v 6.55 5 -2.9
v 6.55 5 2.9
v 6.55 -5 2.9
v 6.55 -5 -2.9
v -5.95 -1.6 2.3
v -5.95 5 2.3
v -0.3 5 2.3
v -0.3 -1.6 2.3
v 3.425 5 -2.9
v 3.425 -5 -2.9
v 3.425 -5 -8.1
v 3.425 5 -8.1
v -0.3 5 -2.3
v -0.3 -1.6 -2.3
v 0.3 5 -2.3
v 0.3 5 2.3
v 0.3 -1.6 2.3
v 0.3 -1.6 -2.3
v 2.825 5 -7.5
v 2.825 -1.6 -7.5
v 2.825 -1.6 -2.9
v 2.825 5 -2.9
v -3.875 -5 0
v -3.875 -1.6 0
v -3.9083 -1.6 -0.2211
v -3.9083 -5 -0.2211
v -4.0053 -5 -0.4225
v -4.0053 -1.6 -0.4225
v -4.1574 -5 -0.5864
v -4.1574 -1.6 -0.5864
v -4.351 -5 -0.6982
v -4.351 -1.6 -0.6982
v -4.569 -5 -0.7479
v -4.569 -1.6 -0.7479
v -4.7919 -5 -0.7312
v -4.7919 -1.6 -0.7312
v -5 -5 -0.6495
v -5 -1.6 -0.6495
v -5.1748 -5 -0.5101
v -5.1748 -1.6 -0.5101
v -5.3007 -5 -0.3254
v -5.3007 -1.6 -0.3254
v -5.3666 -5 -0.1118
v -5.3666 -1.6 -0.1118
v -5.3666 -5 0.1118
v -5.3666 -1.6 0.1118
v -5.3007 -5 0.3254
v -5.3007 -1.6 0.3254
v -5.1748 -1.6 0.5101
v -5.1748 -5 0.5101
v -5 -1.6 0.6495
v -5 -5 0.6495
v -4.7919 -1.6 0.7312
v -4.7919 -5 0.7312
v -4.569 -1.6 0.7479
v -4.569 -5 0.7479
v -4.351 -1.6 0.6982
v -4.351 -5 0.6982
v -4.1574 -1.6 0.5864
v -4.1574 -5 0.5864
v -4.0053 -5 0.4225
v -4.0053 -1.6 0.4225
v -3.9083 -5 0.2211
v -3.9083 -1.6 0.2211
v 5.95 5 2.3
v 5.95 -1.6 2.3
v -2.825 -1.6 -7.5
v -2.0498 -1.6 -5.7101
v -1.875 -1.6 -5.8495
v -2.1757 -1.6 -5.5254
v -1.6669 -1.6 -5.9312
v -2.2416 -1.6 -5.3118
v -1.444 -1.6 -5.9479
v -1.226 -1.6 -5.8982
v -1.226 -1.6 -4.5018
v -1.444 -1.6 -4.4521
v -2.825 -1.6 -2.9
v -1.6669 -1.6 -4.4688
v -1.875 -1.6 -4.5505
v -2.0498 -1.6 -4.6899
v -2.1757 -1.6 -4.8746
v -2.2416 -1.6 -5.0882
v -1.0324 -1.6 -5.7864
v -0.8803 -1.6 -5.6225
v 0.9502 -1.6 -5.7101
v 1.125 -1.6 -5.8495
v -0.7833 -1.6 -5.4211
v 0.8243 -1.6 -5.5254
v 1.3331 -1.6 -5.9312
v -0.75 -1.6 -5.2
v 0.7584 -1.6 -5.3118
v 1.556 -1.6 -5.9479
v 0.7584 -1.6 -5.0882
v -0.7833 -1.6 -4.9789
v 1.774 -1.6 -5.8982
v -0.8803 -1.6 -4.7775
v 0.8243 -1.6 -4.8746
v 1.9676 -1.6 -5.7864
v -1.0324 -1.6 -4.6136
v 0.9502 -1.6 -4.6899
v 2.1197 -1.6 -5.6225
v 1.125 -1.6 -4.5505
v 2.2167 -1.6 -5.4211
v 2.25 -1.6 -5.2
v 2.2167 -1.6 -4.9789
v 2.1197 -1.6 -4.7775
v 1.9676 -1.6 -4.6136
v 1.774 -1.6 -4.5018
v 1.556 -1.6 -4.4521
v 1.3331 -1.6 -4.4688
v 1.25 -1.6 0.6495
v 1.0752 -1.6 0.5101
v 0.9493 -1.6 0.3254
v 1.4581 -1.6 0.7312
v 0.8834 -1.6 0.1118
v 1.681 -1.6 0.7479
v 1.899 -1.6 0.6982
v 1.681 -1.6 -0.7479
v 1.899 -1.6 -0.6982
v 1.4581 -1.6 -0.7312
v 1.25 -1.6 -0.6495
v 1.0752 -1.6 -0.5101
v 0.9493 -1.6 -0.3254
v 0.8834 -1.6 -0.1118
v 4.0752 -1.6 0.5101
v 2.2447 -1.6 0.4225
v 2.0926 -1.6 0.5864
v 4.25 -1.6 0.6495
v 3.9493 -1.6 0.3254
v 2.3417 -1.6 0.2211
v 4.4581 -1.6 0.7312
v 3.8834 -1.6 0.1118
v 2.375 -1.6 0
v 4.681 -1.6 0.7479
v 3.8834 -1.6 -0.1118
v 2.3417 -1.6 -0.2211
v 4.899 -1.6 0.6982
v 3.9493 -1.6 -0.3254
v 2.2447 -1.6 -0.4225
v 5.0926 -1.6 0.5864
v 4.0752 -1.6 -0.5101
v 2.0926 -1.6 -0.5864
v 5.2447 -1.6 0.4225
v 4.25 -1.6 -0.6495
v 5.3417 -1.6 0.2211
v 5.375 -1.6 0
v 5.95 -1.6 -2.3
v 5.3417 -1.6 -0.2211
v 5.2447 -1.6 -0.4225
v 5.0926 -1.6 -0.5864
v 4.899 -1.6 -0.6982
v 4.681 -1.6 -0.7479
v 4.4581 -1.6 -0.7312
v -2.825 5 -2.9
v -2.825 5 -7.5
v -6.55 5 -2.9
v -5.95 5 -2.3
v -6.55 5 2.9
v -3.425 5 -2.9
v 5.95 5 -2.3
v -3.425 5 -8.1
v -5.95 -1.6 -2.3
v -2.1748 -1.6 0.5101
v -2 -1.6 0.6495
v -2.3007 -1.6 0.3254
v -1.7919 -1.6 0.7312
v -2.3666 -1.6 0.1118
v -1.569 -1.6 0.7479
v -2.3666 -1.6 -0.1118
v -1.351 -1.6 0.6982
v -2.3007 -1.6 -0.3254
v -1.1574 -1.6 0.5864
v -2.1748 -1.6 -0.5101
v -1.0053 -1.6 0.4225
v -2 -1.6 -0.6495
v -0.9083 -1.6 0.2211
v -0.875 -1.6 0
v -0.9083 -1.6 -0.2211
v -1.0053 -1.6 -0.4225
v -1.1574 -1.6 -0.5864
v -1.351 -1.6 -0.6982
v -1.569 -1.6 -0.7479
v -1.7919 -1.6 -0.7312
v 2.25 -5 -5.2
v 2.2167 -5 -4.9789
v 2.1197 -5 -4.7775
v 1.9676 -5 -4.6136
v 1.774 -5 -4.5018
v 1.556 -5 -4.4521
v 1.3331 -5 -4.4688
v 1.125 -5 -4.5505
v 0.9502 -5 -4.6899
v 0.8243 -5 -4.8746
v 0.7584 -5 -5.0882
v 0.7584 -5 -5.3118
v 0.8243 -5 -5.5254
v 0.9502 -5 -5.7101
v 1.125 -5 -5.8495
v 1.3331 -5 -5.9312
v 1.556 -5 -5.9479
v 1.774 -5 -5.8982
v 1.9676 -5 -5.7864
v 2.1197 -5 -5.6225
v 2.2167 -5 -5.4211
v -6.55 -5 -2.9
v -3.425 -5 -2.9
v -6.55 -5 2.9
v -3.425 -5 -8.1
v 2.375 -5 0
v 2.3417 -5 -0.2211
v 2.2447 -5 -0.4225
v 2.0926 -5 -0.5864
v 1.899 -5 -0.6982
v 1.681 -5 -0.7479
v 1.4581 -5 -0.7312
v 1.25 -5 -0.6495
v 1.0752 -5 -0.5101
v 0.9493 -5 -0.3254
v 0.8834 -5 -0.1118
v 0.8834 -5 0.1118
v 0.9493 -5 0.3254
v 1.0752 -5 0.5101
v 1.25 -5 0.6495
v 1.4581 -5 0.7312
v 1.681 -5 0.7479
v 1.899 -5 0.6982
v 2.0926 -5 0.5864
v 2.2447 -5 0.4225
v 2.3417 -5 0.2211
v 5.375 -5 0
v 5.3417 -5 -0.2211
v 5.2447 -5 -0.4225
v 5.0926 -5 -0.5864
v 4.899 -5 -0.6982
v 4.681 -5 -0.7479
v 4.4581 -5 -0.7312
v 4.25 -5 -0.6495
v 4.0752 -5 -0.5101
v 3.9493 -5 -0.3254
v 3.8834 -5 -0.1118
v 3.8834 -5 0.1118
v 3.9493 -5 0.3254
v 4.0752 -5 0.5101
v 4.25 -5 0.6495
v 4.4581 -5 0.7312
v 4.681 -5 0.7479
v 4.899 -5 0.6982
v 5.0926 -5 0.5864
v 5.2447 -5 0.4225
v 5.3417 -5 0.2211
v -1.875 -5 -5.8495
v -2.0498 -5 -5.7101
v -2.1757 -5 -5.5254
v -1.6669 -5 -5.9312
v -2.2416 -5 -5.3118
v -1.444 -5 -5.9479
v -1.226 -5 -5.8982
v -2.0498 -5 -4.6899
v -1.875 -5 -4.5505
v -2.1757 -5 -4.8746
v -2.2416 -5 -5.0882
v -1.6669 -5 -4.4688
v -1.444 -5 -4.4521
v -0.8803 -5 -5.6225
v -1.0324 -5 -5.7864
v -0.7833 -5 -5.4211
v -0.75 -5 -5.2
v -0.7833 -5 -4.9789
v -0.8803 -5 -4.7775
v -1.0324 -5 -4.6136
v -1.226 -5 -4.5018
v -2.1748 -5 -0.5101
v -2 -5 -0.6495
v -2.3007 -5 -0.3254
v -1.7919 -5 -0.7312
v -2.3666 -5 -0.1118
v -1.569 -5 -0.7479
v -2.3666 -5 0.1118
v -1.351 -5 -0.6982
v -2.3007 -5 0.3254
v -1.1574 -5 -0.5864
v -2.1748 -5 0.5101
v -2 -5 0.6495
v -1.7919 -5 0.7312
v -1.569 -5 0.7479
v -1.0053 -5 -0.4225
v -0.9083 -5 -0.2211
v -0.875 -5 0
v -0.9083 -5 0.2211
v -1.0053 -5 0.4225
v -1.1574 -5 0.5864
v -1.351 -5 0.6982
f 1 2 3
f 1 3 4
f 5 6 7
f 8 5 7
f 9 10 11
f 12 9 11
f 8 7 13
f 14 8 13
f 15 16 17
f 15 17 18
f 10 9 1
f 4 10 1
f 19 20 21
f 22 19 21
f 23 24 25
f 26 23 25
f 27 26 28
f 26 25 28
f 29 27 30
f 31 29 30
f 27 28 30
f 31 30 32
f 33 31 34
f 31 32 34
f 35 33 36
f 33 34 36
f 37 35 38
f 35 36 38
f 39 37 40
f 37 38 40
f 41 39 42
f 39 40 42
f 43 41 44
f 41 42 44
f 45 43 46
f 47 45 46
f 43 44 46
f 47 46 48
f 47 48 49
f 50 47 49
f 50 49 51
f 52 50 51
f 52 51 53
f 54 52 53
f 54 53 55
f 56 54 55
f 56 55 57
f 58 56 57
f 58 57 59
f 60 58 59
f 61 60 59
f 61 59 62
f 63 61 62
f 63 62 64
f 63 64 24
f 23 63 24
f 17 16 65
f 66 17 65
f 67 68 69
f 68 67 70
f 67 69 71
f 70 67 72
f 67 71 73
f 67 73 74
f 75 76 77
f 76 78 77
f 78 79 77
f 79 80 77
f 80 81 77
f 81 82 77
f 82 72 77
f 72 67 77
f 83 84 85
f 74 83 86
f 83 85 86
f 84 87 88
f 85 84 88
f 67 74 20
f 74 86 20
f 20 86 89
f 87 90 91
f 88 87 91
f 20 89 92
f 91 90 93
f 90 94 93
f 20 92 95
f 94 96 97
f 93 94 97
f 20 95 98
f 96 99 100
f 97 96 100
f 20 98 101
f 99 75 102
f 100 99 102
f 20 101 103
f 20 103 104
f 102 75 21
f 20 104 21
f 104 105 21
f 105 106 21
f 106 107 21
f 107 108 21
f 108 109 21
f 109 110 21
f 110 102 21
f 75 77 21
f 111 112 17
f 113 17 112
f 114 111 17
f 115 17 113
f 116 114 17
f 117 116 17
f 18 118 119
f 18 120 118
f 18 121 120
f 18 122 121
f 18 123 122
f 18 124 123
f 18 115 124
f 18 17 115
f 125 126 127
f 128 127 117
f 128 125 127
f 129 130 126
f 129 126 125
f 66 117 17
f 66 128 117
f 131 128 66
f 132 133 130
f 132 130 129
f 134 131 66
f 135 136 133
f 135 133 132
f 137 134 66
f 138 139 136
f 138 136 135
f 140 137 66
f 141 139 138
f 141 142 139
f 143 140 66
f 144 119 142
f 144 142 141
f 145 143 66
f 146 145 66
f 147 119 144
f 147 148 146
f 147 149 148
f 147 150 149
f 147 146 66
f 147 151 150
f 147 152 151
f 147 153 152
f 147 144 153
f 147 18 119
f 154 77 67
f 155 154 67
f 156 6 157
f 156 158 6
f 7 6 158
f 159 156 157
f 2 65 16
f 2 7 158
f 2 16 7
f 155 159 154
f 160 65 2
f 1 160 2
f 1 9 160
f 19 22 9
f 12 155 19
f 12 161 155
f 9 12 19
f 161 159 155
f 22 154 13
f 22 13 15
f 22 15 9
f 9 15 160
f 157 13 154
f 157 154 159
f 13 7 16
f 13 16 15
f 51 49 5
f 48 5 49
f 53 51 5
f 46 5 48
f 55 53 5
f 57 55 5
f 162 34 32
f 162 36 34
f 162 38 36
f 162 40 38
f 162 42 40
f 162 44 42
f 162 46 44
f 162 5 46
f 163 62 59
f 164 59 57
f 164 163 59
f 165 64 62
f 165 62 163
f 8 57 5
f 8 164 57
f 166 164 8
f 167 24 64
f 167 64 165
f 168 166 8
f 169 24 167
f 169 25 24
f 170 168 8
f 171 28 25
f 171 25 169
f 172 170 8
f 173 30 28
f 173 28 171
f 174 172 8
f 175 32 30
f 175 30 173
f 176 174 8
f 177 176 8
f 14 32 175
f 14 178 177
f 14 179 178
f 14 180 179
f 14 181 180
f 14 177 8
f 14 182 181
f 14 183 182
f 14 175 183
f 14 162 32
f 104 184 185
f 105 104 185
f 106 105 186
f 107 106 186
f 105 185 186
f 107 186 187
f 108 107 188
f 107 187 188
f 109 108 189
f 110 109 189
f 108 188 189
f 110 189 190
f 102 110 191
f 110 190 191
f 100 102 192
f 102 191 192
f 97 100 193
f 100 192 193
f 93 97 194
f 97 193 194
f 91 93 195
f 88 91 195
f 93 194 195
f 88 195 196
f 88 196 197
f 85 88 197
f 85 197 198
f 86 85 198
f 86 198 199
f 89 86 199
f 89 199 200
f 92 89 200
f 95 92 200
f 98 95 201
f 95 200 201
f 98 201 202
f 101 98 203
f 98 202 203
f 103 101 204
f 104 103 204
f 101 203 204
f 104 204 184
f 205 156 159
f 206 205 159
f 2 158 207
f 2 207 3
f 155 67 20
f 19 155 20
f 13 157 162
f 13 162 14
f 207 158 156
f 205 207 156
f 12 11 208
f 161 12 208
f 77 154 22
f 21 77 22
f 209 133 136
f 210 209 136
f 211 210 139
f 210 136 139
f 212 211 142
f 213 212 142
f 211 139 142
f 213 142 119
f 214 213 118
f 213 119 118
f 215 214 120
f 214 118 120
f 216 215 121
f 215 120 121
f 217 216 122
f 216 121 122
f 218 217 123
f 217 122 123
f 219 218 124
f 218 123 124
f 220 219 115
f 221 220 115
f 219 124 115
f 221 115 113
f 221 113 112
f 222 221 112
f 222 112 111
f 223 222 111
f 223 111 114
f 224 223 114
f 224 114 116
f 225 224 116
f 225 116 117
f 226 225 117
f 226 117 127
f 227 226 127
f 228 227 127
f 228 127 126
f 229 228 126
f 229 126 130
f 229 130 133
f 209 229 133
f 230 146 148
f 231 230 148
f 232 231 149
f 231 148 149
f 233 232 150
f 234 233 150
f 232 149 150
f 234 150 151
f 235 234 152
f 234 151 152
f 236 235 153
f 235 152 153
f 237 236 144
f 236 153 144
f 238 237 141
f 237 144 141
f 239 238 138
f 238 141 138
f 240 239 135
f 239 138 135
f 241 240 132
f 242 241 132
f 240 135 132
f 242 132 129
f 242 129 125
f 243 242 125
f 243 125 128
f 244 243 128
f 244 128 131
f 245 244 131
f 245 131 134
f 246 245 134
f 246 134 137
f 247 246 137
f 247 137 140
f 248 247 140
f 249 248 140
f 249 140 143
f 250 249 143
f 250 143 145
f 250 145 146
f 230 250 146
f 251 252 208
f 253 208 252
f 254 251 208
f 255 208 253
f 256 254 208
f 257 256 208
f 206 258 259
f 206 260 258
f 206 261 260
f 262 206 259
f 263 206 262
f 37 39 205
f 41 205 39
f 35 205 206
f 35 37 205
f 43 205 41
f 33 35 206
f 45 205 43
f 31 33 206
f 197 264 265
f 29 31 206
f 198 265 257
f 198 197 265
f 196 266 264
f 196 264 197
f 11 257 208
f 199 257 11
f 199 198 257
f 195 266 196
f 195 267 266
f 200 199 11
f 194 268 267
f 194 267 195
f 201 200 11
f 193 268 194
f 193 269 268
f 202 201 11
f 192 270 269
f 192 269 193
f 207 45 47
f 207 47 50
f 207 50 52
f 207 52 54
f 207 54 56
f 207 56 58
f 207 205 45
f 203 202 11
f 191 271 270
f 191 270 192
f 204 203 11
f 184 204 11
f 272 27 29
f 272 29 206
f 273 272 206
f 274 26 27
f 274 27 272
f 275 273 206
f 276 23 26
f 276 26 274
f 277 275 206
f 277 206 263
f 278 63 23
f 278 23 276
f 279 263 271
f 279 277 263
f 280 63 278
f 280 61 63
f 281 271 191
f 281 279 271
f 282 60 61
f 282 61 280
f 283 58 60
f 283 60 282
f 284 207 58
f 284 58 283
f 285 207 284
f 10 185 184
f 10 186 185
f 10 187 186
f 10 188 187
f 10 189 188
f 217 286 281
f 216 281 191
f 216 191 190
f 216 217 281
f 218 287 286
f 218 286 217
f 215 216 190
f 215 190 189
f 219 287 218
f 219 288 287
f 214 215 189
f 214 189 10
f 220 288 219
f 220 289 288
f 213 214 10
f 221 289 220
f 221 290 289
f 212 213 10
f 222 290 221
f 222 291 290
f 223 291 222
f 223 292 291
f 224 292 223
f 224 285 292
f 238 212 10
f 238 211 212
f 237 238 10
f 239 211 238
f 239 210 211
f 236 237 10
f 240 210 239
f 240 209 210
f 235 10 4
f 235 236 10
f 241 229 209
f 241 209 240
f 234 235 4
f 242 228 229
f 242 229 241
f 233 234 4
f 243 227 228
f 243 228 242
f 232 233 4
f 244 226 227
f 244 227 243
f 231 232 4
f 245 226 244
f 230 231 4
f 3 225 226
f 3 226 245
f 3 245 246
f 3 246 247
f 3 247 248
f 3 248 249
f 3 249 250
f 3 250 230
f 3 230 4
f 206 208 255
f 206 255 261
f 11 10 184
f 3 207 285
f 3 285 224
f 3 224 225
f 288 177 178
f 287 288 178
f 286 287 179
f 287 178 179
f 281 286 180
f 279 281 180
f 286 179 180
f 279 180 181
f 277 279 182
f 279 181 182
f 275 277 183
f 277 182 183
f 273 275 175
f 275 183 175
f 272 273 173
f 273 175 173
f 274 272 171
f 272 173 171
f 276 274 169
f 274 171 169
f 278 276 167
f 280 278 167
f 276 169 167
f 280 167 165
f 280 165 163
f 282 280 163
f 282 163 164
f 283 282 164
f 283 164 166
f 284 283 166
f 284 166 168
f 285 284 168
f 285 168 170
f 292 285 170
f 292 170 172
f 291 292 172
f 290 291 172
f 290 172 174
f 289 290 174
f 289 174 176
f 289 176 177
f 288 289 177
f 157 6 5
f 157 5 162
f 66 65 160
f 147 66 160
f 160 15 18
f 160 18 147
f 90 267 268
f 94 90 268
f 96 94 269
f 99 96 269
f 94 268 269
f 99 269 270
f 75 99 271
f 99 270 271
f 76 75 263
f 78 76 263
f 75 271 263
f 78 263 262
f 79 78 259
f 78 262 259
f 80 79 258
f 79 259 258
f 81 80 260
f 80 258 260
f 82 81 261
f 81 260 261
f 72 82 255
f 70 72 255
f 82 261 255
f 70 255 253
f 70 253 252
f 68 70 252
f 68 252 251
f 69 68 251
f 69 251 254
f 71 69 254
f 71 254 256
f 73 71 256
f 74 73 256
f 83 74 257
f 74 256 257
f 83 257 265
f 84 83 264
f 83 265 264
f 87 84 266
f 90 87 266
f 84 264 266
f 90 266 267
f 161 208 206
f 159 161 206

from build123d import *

# Parameters (mm, degrees)
SKETCH1_W               = 13.1
SKETCH1_H               = 5.8
BOSS_EXTRUDE1_DEPTH     = 5
SKETCH10_W              = 5.65
SKETCH10_H              = 4.6
CUT_EXTRUDE7_DEPTH      = 6.6
SKETCH9_R               = 0.75
CUT_EXTRUDE6_DEPTH      = 6
CUT_EXTRUDE6_DEPTH_BACK = 6
BOSS_EXTRUDE2_START     = -5
BOSS_EXTRUDE2_DEPTH     = 10
SKETCH12_W              = 5.65
SKETCH12_H              = 4.6
SKETCH12_R              = 0.75
BOSS_EXTRUDE3_DEPTH     = 3.4


with BuildPart() as part:
    # Sketch1 → Boss-Extrude1 (new body, symmetric)
    with BuildSketch(Plane(origin=(0, 0, 0), x_dir=(1, 0, 0), z_dir=(0, 1, 0))):
        Rectangle(SKETCH1_W, SKETCH1_H)
    extrude(amount=BOSS_EXTRUDE1_DEPTH, both=True)

    # Sketch10 → Cut-Extrude7 (cut)
    with BuildSketch(Plane(origin=(0, 5, 0), x_dir=(1, 0, 0), z_dir=(0, 1, 0))):
        with Locations((-3.125, 0)):
            Rectangle(SKETCH10_W, SKETCH10_H)
        with Locations((3.125, 0)):
            Rectangle(SKETCH10_W, SKETCH10_H)
    extrude(amount=-CUT_EXTRUDE7_DEPTH, mode=Mode.SUBTRACT)

    # Sketch9 → Cut-Extrude6 (cut, two sides)
    with BuildSketch(Plane(origin=(0, 0, 0), x_dir=(1, 0, 0), z_dir=(0, 1, 0))) as cut_extrude6_sk:
        with Locations((-4.625, 0)):
            Circle(SKETCH9_R)
        with Locations((-1.625, 0)):
            Circle(SKETCH9_R)
        with Locations((1.625, 0)):
            Circle(SKETCH9_R)
        with Locations((4.625, 0)):
            Circle(SKETCH9_R)
    extrude(amount=CUT_EXTRUDE6_DEPTH, mode=Mode.SUBTRACT)
    extrude(cut_extrude6_sk.sketch, amount=-CUT_EXTRUDE6_DEPTH_BACK, mode=Mode.SUBTRACT)

    # Sketch11 → Boss-Extrude2 (add)
    with BuildSketch(Plane(origin=(0, 0, 0), x_dir=(1, 0, 0), z_dir=(0, 1, 0)).offset(BOSS_EXTRUDE2_START)):
        Polygon((-3.425, 8.1), (-3.425, 2.9), (-2.825, 2.9), (-2.825, 7.5), (2.825, 7.5), (2.825, 2.9), (3.425, 2.9), (3.425, 8.1), align=None)
    extrude(amount=BOSS_EXTRUDE2_DEPTH)

    # Sketch12 → Boss-Extrude3 (add)
    with BuildSketch(Plane.XZ.offset(5)):
        with Locations((0, -5.2)):
            Rectangle(SKETCH12_W, SKETCH12_H)
        with Locations((-1.5, -5.2)):
            Circle(SKETCH12_R, mode=Mode.SUBTRACT)
        with Locations((1.5, -5.2)):
            Circle(SKETCH12_R, mode=Mode.SUBTRACT)
    extrude(amount=-BOSS_EXTRUDE3_DEPTH)


solid = part.part
